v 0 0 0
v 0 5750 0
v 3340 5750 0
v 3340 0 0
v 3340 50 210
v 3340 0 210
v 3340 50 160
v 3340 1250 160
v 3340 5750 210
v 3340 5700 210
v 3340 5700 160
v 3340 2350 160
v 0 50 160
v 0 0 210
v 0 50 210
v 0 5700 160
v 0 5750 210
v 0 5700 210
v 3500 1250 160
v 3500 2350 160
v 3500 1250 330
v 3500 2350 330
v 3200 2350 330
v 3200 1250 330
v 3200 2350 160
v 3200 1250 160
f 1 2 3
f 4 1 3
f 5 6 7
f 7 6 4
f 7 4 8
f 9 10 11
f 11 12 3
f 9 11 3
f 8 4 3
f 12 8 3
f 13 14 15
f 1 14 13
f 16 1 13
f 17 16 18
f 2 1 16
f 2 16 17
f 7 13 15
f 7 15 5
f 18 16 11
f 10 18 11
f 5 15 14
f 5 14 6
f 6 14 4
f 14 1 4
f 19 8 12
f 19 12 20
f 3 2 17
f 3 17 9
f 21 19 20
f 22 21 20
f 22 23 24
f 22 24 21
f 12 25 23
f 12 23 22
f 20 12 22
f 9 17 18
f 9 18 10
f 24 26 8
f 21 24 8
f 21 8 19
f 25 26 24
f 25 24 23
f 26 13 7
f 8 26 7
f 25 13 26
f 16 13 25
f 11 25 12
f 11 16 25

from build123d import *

# Parameters (mm, degrees)
F0_W     = 3500
F0_H     = 5750
F1_DEPTH = 160
F2_W     = 300
F2_H     = 1100
F3_DEPTH = 170
F4_W     = 160
F4_H     = 160
F5_DEPTH = 5750.001
F8_W     = 3340
F8_H     = 50
F9_DEPTH = 50


# Not quite as in the source:
# - a feature of the source that left no trace in its solid (it failed there, or was rolled back) is left out


with BuildPart() as f1:
    # F0 (on Top) → F1 (new body)
    with BuildSketch(Plane.XY):
        with Locations((1750, 2875)):
            Rectangle(F0_W, F0_H)
    extrude(amount=F1_DEPTH)

    # F2 (on face) → F3 (join)
    with BuildSketch(Plane.XY.offset(160)):
        with Locations((3350, 1800)):
            Rectangle(F2_W, F2_H)
    extrude(amount=F3_DEPTH)

    # F4 (on face) → F5 (cut, through all)
    with BuildSketch(Plane.XZ):
        with Locations((3420, 80)):
            Rectangle(F4_W, F4_H)
    extrude(amount=-F5_DEPTH, mode=Mode.SUBTRACT)

    # F8 (on face) → F9 (join)
    with BuildSketch(Plane.XY.offset(160)):
        with Locations((1670, 25)):
            Rectangle(F8_W, F8_H)
        with Locations((1670, 5725)):
            Rectangle(F8_W, F8_H)
    extrude(amount=F9_DEPTH)


solid = f1.part
